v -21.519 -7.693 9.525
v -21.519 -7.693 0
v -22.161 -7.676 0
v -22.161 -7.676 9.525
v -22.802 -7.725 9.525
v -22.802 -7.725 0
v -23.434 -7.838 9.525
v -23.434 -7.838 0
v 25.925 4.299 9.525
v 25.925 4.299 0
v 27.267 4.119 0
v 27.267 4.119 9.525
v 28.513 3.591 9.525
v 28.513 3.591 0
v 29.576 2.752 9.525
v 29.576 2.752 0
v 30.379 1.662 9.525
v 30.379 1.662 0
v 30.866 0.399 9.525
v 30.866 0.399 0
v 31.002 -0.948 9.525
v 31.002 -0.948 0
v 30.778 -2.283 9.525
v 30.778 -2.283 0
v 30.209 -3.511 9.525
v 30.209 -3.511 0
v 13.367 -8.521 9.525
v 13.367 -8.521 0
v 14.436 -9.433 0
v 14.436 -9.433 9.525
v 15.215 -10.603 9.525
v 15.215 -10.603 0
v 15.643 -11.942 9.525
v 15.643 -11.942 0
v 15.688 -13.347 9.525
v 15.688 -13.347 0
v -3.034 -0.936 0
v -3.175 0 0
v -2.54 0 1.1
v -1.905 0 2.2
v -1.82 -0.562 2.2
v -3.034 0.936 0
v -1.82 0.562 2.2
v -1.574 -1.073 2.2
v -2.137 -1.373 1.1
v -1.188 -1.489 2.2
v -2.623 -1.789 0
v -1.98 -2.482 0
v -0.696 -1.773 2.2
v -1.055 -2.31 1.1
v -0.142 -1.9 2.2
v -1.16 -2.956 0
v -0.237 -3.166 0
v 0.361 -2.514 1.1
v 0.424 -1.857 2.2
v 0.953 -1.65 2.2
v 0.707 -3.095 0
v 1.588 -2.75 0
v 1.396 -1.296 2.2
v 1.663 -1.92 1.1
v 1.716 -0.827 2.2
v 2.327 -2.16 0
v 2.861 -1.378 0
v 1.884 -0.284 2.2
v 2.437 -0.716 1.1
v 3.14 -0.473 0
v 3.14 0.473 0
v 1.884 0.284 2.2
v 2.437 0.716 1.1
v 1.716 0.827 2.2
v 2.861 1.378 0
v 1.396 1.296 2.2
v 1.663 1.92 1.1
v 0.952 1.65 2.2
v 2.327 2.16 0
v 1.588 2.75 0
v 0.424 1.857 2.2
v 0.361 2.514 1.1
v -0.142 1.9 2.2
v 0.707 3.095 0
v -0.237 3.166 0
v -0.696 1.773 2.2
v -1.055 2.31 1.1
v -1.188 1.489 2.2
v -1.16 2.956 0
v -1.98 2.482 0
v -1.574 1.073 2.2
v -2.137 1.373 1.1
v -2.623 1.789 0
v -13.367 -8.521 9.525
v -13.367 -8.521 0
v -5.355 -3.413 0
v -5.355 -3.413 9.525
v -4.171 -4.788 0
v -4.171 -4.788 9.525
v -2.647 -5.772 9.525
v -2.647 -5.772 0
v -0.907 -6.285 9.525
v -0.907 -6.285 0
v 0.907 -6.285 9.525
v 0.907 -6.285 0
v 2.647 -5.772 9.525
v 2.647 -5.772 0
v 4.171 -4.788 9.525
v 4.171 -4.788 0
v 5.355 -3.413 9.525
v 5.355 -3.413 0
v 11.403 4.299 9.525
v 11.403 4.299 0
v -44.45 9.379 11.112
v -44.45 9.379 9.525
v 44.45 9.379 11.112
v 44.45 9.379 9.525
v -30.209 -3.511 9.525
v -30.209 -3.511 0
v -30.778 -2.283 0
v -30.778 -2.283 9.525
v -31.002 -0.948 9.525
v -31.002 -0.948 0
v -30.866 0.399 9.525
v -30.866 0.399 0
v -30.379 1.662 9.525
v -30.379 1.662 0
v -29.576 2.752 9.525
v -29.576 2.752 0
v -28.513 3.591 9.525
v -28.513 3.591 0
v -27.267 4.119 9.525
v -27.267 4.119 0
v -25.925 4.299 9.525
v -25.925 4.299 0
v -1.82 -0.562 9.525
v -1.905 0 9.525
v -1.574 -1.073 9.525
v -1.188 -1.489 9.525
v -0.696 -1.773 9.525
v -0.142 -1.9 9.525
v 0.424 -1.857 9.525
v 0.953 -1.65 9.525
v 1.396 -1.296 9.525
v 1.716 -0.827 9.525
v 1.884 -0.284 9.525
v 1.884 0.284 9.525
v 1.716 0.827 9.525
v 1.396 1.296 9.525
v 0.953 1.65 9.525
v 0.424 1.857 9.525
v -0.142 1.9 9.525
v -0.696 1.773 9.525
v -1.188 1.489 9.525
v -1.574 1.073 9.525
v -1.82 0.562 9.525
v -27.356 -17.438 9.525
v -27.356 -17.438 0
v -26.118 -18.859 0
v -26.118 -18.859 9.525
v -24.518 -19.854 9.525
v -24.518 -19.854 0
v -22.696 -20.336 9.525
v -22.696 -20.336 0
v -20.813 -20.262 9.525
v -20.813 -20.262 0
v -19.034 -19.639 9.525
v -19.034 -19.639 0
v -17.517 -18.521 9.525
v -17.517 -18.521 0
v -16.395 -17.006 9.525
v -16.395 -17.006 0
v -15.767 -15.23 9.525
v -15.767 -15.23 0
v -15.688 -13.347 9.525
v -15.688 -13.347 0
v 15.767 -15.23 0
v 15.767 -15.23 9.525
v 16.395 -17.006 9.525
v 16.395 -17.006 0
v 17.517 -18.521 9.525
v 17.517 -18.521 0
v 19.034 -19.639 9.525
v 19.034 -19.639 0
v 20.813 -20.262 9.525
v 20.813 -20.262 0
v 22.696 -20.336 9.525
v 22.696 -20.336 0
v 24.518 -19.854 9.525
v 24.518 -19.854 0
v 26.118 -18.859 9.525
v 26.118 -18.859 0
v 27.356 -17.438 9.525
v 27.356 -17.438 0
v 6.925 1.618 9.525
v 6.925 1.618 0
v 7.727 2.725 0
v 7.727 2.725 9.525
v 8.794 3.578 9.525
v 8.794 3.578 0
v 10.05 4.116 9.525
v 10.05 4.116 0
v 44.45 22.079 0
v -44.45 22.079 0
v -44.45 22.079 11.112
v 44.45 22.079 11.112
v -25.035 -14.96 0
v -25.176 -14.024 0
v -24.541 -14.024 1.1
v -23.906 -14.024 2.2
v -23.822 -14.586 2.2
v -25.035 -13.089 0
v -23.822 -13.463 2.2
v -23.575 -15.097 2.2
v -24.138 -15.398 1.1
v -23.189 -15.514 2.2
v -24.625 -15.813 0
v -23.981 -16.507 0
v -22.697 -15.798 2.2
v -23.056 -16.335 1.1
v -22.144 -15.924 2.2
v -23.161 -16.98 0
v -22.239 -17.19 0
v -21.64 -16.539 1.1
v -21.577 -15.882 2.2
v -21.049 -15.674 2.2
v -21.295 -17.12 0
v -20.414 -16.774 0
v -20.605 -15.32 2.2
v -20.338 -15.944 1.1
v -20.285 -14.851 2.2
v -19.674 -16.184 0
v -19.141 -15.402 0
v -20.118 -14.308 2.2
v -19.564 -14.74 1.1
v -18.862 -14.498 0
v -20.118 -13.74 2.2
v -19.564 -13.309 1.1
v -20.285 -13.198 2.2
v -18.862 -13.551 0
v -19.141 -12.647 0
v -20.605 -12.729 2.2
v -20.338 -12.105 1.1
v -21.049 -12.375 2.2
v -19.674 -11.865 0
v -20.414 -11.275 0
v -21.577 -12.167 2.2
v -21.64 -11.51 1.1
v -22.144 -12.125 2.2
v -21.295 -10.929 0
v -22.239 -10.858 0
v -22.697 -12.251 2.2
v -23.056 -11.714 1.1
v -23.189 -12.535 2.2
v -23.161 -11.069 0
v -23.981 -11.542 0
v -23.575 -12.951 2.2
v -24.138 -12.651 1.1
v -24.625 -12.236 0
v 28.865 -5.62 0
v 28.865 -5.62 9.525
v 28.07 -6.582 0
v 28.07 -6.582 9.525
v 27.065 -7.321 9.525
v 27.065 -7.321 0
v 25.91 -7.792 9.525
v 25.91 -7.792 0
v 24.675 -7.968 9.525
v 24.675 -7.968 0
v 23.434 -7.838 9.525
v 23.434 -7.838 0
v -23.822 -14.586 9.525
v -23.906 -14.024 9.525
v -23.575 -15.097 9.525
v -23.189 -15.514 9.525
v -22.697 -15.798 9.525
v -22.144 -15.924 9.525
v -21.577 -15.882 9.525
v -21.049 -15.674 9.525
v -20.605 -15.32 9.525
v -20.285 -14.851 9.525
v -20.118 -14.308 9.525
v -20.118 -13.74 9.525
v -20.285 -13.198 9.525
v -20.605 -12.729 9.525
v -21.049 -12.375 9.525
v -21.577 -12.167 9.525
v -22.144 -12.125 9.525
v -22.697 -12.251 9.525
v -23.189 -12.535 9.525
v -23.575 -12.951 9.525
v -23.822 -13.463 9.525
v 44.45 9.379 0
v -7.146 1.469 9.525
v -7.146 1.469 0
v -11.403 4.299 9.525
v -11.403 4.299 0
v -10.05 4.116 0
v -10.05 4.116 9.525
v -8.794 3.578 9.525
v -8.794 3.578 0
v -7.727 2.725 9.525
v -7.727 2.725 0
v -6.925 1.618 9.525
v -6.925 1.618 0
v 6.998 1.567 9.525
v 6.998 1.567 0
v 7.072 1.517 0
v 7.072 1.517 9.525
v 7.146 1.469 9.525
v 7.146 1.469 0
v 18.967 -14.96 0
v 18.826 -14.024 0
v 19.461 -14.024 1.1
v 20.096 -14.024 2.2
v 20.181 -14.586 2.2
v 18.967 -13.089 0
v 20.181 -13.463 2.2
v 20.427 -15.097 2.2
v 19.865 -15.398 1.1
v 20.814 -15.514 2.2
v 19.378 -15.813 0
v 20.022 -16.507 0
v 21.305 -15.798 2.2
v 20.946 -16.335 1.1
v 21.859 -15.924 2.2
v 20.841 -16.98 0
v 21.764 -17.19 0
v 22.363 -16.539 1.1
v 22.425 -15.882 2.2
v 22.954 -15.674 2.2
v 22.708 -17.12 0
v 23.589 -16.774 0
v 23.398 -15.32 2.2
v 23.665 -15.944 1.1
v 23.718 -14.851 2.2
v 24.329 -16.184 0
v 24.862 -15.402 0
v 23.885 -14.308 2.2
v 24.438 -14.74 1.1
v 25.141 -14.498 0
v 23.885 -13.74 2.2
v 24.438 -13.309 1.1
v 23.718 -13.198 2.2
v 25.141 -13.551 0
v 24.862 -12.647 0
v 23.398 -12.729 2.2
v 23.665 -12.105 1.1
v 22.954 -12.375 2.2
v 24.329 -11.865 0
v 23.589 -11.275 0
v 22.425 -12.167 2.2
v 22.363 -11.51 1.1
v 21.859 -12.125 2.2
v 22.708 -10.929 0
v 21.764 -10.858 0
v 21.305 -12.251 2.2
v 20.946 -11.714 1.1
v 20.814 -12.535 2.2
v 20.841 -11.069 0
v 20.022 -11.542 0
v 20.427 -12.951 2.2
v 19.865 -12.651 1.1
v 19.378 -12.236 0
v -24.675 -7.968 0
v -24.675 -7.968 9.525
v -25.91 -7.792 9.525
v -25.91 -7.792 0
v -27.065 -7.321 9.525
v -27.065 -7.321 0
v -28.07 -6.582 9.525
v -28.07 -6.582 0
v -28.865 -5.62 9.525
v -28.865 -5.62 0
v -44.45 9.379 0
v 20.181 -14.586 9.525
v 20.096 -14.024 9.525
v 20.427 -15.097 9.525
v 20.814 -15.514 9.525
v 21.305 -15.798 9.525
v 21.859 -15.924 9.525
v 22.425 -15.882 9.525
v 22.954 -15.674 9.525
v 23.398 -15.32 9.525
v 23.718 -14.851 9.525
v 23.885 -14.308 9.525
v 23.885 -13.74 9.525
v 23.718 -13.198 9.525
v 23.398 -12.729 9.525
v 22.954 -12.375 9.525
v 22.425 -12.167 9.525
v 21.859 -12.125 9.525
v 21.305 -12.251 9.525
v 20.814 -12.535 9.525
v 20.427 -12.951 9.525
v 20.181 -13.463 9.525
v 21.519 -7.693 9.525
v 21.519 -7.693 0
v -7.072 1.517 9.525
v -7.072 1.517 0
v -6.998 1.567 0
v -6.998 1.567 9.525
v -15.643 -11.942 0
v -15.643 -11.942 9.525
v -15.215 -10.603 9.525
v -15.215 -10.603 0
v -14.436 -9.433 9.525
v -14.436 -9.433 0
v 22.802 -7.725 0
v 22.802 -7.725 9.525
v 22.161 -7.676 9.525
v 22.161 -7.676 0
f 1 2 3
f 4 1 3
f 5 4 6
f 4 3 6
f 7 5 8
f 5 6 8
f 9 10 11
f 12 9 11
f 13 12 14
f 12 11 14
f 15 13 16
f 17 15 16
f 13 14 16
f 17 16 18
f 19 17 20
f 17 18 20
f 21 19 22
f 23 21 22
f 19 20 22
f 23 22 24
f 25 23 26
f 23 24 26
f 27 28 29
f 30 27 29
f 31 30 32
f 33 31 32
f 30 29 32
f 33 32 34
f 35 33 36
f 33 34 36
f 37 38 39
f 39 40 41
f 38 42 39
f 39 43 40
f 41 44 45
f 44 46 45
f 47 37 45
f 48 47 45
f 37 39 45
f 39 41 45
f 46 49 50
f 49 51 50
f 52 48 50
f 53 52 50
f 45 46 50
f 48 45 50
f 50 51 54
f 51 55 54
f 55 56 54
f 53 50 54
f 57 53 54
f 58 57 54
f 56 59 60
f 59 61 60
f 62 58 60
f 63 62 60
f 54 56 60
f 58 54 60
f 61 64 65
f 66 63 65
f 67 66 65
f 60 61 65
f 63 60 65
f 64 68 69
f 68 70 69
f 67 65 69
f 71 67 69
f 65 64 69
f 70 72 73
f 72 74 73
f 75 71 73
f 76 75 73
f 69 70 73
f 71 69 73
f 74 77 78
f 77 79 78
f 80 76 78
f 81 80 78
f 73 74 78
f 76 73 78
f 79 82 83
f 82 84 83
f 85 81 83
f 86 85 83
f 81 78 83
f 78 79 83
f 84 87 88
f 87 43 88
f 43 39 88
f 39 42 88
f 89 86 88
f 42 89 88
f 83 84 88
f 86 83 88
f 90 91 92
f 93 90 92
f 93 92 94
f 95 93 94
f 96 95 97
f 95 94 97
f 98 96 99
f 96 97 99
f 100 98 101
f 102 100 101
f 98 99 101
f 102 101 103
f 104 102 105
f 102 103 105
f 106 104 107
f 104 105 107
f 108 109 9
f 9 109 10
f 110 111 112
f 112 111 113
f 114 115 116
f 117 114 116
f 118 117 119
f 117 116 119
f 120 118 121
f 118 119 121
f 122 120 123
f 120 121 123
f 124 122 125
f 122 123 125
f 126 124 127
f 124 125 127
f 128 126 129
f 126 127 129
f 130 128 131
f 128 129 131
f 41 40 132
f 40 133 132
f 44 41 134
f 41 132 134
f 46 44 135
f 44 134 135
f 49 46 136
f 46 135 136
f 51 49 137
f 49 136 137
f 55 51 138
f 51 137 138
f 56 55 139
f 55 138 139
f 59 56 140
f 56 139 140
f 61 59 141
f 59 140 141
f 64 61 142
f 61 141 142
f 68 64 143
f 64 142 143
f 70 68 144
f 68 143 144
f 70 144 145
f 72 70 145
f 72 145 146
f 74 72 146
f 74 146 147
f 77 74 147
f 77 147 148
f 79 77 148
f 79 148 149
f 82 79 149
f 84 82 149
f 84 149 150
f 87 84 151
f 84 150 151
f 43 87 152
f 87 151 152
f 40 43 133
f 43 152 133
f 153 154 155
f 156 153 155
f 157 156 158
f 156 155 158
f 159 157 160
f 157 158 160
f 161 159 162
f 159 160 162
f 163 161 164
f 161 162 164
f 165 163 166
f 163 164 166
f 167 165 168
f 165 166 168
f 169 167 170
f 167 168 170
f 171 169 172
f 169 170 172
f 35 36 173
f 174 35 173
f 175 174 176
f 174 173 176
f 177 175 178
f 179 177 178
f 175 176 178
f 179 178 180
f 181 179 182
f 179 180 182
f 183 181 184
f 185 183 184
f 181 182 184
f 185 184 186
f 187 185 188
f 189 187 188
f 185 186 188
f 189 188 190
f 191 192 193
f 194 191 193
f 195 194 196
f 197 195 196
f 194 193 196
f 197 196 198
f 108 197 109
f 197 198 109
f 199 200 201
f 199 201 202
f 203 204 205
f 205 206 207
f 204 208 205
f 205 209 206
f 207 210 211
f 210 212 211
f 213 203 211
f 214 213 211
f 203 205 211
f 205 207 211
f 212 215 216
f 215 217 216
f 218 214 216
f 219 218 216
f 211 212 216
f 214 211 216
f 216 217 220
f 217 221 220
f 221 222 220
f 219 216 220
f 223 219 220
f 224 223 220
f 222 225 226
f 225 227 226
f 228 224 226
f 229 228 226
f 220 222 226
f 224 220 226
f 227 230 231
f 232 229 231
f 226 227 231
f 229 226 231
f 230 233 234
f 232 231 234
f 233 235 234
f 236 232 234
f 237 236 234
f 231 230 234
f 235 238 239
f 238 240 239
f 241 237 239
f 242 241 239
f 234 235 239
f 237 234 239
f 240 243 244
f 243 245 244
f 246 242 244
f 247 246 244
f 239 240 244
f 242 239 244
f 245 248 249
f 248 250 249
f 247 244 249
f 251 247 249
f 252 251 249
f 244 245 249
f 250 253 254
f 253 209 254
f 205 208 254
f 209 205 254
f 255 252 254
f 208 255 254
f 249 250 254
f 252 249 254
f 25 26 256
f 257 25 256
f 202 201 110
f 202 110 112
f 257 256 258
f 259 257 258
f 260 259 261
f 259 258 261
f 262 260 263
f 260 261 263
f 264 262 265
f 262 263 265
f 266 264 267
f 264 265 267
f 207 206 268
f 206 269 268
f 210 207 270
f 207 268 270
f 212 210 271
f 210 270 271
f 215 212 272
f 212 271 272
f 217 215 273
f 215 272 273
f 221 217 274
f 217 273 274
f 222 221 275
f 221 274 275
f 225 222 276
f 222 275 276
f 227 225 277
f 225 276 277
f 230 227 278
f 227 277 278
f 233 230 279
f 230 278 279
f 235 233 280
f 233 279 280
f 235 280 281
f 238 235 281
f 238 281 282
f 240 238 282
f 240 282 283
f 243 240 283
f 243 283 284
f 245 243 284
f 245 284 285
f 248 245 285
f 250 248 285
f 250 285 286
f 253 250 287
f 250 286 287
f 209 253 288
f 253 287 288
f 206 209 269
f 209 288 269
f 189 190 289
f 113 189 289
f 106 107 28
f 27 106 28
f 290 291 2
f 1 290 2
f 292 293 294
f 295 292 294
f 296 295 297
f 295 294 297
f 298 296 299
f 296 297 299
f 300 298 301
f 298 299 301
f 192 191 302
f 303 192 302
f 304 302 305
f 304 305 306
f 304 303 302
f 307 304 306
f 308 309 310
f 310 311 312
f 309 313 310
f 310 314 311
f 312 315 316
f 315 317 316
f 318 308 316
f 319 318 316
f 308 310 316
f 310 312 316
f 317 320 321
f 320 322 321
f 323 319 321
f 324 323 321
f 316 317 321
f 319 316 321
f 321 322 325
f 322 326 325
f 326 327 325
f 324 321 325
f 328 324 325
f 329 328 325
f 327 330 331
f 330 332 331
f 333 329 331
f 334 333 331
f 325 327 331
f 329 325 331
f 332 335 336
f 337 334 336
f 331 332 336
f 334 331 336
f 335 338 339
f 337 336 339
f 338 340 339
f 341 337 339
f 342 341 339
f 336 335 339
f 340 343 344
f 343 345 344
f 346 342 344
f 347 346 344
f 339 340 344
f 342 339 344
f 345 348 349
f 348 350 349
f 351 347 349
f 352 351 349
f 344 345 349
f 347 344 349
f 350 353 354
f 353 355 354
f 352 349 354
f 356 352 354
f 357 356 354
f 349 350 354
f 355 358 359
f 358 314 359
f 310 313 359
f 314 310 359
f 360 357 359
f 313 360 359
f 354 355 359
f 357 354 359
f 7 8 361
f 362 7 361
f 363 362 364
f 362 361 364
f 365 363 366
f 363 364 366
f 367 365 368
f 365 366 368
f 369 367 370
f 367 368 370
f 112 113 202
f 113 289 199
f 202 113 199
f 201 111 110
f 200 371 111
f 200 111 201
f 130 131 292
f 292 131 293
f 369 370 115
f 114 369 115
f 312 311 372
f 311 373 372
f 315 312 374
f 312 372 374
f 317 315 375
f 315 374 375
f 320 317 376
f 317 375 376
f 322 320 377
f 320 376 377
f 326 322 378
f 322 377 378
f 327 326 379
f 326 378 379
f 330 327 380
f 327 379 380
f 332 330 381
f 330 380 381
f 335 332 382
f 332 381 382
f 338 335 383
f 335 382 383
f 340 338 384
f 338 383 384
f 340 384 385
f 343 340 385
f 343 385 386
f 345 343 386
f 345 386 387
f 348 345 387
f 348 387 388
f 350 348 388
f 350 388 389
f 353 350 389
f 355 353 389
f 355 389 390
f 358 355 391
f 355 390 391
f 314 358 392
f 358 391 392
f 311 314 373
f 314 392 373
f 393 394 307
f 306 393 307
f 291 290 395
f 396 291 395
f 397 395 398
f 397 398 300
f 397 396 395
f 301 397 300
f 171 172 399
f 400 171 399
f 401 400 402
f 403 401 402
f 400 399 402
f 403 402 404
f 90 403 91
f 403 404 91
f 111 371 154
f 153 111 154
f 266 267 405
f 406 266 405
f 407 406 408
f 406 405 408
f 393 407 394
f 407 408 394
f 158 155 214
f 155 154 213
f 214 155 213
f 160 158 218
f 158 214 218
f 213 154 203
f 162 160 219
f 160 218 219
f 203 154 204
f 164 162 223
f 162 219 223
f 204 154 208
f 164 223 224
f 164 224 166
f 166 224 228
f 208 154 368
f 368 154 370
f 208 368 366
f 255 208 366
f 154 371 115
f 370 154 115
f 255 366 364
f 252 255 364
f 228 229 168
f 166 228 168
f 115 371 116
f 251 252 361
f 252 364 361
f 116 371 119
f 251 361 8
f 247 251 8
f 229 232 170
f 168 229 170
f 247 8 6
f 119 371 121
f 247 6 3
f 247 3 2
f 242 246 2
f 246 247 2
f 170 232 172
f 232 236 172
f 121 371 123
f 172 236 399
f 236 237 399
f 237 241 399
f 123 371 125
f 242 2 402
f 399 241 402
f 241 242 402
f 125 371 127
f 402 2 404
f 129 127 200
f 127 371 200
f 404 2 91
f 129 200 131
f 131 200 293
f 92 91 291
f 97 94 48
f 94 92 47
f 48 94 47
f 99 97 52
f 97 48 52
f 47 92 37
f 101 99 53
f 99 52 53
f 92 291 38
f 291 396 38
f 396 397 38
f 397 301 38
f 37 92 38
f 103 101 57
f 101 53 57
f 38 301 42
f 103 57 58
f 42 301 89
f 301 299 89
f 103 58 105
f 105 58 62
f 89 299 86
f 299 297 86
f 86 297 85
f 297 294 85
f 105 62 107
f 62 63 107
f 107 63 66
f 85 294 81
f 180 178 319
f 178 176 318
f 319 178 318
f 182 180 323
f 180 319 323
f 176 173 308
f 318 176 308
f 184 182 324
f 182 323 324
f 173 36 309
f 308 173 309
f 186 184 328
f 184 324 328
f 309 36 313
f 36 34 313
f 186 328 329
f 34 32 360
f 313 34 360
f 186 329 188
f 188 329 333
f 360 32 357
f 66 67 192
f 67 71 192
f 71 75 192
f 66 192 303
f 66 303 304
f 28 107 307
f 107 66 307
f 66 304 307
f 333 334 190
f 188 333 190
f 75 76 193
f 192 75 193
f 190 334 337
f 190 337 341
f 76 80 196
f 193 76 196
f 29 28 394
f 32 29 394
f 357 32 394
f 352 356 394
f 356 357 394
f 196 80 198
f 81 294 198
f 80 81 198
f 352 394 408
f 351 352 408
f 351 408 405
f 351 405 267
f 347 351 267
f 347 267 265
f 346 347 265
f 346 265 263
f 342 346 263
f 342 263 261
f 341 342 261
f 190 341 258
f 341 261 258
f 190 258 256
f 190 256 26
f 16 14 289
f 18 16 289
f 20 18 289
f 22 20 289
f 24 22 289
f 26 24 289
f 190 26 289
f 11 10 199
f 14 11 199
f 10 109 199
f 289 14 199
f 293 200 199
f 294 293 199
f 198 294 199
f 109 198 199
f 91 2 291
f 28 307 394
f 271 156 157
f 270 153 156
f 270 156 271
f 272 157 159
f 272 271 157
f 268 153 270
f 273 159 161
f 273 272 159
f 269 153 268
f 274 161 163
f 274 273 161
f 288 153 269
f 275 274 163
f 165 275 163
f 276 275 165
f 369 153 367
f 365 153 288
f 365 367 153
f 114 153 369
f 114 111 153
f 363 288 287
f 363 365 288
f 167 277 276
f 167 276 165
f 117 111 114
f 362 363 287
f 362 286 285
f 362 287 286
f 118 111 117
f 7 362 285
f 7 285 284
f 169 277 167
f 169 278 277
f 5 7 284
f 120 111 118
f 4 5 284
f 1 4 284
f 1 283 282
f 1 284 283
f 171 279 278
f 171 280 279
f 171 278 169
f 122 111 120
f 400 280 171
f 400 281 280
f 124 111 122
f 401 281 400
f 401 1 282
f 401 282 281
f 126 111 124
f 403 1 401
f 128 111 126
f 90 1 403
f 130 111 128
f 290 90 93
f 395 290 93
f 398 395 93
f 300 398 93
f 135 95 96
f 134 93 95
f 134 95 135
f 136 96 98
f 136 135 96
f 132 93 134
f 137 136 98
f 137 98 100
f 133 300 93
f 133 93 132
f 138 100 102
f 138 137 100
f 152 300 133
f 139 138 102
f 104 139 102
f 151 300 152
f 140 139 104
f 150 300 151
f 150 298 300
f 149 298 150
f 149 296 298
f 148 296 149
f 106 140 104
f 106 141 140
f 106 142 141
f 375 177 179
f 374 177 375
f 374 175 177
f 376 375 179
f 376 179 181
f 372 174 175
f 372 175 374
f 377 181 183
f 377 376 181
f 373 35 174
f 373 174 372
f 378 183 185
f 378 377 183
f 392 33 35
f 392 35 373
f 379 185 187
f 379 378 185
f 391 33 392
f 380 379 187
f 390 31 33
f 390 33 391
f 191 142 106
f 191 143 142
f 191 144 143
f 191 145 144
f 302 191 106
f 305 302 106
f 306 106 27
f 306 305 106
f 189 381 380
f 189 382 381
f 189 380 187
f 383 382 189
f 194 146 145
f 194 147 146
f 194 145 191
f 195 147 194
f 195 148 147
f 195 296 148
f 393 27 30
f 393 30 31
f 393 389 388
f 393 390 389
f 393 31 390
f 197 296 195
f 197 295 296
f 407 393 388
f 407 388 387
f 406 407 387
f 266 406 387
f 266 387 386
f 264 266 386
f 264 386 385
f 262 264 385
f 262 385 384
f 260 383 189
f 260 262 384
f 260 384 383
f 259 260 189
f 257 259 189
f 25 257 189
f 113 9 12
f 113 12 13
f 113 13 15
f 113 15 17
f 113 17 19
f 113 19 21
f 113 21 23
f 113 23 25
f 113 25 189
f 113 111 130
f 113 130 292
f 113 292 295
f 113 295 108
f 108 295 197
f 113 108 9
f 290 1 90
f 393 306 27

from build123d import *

# Parameters (mm, degrees)
F1_DEPTH       = 9.525
F2_T1_DEPTH    = 9.525
F3_W           = 88.9
F3_H           = 12.7
F4_DEPTH       = 1.5875
F6_D           = 3.81
F6_CSINK_D     = 6.35
F6_CSINK_ANGLE = 60


# Not quite as in the source:
# - a fillet or chamfer that OpenCascade refuses, or shapes differently, is made with other operations: its cross-section is extruded or revolved along the edge and cut away or added


with BuildPart() as f1:
    # F0 (on Top) → F1 (new body)
    with BuildSketch(Plane.XY):
        with BuildLine():
            Line((-16.6466649714, -10.6111378352), (-5.3546547037, -3.4132349764))
            ThreePointArc((-5.3546547037, -3.4132349764), (0, -6.35), (5.3546547037, -3.4132349764))
            Line((5.3546547037, -3.4132349764), (16.6466649714, -10.6111378352))
            ThreePointArc((16.6466649714, -10.6111378352), (18.5880846986, -19.3790275153), (27.3559743788, -17.437607788))
            Line((27.3559743788, -17.437607788), (44.45, 9.3793577389))
            Line((44.45, 9.3793577389), (44.45, 22.0793577389))
            Line((44.45, 22.0793577389), (-44.45, 22.0793577389))
            Line((-44.45, 22.0793577389), (-44.45, 9.3793577389))
            Line((-44.45, 9.3793577389), (-27.3559743788, -17.437607788))
            ThreePointArc((-27.3559743788, -17.437607788), (-18.5880846986, -19.3790275153), (-16.6466649714, -10.6111378352))
        make_face()
        with BuildLine():
            Line((-5.9433808033, 2.2357827771), (-21.519114834, -7.6927080628))
            ThreePointArc((-21.519114834, -7.6927080628), (-24.1573435523, -8.0515961507), (-26.4165242416, -9.4605510978))
            Line((-26.4165242416, -9.4605510978), (-35.1875477179, 4.2993577389))
            Line((-35.1875477179, 4.2993577389), (-4.6731170575, 4.2993577389))
            ThreePointArc((-4.6731170575, 4.2993577389), (-5.4075957794, 3.3287246638), (-5.9433808033, 2.2357827771))
        make_face(mode=Mode.SUBTRACT)
        with BuildLine():
            ThreePointArc((5.9433808033, 2.2357827771), (5.4075957794, 3.3287246638), (4.6731170575, 4.2993577389))
            Line((4.6731170575, 4.2993577389), (35.1875477179, 4.2993577389))
            Line((35.1875477179, 4.2993577389), (26.4165242416, -9.4605510978))
            ThreePointArc((26.4165242416, -9.4605510978), (24.1573435523, -8.0515961507), (21.519114834, -7.6927080628))
            Line((21.519114834, -7.6927080628), (5.9433808033, 2.2357827771))
        make_face(mode=Mode.SUBTRACT)
    extrude(amount=F1_DEPTH)

    # F2: fillet of radius 5.08 on 10 edges, made by hand

    # F2_s2 → F2_t1 (join)
    with BuildSketch(Plane.XY):
        with BuildLine():
            ThreePointArc((25.9250954358, 4.2993577389), (30.3791827129, 1.6622057751), (30.2088191987, -3.5112302422))
            Line((30.2088191987, -3.5112302422), (35.1875477179, 4.2993577389))
            Line((35.1875477179, 4.2993577389), (25.9250954358, 4.2993577389))
        make_face()
        with BuildLine():
            ThreePointArc((28.86470245, -5.6198694424), (26.5021187872, -7.5920062794), (23.4344635706, -7.8382109503))
            ThreePointArc((23.4344635706, -7.8382109503), (25.0359187955, -8.4464064996), (26.4165242416, -9.4605510978))
            Line((26.4165242416, -9.4605510978), (28.86470245, -5.6198694424))
        make_face()
        with BuildLine():
            ThreePointArc((6.3351726778, -0.433690145), (7.9360436505, 2.9321004414), (11.4033108201, 4.2993577389))
            Line((11.4033108201, 4.2993577389), (4.6731170575, 4.2993577389))
            ThreePointArc((4.6731170575, 4.2993577389), (5.9913309283, 2.1039139022), (6.3351726778, -0.433690145))
        make_face()
        with BuildLine():
            ThreePointArc((5.4870763048, 3.1960121441), (6.2133994477, 2.2333964199), (7.1461493675, 1.4690980964))
            Line((7.1461493675, 1.4690980964), (5.9433808033, 2.2357827771))
            ThreePointArc((5.9433808033, 2.2357827771), (5.7353594076, 2.7254637156), (5.4870763048, 3.1960121441))
        make_face()
        with BuildLine():
            ThreePointArc((-7.1461493675, 1.4690980964), (-6.2133994477, 2.2333964199), (-5.4870763048, 3.1960121441))
            ThreePointArc((-5.4870763048, 3.1960121441), (-5.7353594076, 2.7254637156), (-5.9433808033, 2.2357827771))
            Line((-5.9433808033, 2.2357827771), (-7.1461493675, 1.4690980964))
        make_face()
        with BuildLine():
            ThreePointArc((-11.4033108201, 4.2993577389), (-7.9360436505, 2.9321004414), (-6.3351726778, -0.433690145))
            ThreePointArc((-6.3351726778, -0.433690145), (-5.9913309283, 2.1039139022), (-4.6731170575, 4.2993577389))
            Line((-4.6731170575, 4.2993577389), (-11.4033108201, 4.2993577389))
        make_face()
        with BuildLine():
            ThreePointArc((-23.4344635706, -7.8382109503), (-26.5021187872, -7.5920062794), (-28.86470245, -5.6198694424))
            Line((-28.86470245, -5.6198694424), (-26.4165242416, -9.4605510978))
            ThreePointArc((-26.4165242416, -9.4605510978), (-25.0359187955, -8.4464064996), (-23.4344635706, -7.8382109503))
        make_face()
        with BuildLine():
            ThreePointArc((-30.2088191987, -3.5112302422), (-30.3791827129, 1.6622057751), (-25.9250954358, 4.2993577389))
            Line((-25.9250954358, 4.2993577389), (-35.1875477179, 4.2993577389))
            Line((-35.1875477179, 4.2993577389), (-30.2088191987, -3.5112302422))
        make_face()
        with BuildLine():
            ThreePointArc((-15.6875923106, -13.3466215538), (-15.2148846453, -10.6031015998), (-13.3671984002, -8.5206967846))
            Line((-13.3671984002, -8.5206967846), (-16.6466649714, -10.6111378352))
            ThreePointArc((-16.6466649714, -10.6111378352), (-16.0089492913, -11.9234213166), (-15.6875923106, -13.3466215538))
        make_face()
        with BuildLine():
            ThreePointArc((13.3671984002, -8.5206967846), (15.2148846453, -10.6031015998), (15.6875923106, -13.3466215538))
            ThreePointArc((15.6875923106, -13.3466215538), (16.0089492913, -11.9234213166), (16.6466649714, -10.6111378352))
            Line((16.6466649714, -10.6111378352), (13.3671984002, -8.5206967846))
        make_face()
    extrude(amount=F2_T1_DEPTH)

    # F3 (on face) → F4 (join)
    with BuildSketch(Plane.XY.offset(9.525)):
        with Locations((0, 15.7293577389)):
            Rectangle(F3_W, F3_H)
    extrude(amount=F4_DEPTH)

    # F6 (through all)
    with Locations(Plane(origin=(0, 0, 0), x_dir=(1, 0, 0), z_dir=(0, 0, -1))):
        with Locations((0, 0), (-22.0013196751, 14.0243728116), (22.0013196751, 14.0243728116)):
            CounterSinkHole(F6_D / 2, F6_CSINK_D / 2, counter_sink_angle=F6_CSINK_ANGLE)


solid = f1.part
